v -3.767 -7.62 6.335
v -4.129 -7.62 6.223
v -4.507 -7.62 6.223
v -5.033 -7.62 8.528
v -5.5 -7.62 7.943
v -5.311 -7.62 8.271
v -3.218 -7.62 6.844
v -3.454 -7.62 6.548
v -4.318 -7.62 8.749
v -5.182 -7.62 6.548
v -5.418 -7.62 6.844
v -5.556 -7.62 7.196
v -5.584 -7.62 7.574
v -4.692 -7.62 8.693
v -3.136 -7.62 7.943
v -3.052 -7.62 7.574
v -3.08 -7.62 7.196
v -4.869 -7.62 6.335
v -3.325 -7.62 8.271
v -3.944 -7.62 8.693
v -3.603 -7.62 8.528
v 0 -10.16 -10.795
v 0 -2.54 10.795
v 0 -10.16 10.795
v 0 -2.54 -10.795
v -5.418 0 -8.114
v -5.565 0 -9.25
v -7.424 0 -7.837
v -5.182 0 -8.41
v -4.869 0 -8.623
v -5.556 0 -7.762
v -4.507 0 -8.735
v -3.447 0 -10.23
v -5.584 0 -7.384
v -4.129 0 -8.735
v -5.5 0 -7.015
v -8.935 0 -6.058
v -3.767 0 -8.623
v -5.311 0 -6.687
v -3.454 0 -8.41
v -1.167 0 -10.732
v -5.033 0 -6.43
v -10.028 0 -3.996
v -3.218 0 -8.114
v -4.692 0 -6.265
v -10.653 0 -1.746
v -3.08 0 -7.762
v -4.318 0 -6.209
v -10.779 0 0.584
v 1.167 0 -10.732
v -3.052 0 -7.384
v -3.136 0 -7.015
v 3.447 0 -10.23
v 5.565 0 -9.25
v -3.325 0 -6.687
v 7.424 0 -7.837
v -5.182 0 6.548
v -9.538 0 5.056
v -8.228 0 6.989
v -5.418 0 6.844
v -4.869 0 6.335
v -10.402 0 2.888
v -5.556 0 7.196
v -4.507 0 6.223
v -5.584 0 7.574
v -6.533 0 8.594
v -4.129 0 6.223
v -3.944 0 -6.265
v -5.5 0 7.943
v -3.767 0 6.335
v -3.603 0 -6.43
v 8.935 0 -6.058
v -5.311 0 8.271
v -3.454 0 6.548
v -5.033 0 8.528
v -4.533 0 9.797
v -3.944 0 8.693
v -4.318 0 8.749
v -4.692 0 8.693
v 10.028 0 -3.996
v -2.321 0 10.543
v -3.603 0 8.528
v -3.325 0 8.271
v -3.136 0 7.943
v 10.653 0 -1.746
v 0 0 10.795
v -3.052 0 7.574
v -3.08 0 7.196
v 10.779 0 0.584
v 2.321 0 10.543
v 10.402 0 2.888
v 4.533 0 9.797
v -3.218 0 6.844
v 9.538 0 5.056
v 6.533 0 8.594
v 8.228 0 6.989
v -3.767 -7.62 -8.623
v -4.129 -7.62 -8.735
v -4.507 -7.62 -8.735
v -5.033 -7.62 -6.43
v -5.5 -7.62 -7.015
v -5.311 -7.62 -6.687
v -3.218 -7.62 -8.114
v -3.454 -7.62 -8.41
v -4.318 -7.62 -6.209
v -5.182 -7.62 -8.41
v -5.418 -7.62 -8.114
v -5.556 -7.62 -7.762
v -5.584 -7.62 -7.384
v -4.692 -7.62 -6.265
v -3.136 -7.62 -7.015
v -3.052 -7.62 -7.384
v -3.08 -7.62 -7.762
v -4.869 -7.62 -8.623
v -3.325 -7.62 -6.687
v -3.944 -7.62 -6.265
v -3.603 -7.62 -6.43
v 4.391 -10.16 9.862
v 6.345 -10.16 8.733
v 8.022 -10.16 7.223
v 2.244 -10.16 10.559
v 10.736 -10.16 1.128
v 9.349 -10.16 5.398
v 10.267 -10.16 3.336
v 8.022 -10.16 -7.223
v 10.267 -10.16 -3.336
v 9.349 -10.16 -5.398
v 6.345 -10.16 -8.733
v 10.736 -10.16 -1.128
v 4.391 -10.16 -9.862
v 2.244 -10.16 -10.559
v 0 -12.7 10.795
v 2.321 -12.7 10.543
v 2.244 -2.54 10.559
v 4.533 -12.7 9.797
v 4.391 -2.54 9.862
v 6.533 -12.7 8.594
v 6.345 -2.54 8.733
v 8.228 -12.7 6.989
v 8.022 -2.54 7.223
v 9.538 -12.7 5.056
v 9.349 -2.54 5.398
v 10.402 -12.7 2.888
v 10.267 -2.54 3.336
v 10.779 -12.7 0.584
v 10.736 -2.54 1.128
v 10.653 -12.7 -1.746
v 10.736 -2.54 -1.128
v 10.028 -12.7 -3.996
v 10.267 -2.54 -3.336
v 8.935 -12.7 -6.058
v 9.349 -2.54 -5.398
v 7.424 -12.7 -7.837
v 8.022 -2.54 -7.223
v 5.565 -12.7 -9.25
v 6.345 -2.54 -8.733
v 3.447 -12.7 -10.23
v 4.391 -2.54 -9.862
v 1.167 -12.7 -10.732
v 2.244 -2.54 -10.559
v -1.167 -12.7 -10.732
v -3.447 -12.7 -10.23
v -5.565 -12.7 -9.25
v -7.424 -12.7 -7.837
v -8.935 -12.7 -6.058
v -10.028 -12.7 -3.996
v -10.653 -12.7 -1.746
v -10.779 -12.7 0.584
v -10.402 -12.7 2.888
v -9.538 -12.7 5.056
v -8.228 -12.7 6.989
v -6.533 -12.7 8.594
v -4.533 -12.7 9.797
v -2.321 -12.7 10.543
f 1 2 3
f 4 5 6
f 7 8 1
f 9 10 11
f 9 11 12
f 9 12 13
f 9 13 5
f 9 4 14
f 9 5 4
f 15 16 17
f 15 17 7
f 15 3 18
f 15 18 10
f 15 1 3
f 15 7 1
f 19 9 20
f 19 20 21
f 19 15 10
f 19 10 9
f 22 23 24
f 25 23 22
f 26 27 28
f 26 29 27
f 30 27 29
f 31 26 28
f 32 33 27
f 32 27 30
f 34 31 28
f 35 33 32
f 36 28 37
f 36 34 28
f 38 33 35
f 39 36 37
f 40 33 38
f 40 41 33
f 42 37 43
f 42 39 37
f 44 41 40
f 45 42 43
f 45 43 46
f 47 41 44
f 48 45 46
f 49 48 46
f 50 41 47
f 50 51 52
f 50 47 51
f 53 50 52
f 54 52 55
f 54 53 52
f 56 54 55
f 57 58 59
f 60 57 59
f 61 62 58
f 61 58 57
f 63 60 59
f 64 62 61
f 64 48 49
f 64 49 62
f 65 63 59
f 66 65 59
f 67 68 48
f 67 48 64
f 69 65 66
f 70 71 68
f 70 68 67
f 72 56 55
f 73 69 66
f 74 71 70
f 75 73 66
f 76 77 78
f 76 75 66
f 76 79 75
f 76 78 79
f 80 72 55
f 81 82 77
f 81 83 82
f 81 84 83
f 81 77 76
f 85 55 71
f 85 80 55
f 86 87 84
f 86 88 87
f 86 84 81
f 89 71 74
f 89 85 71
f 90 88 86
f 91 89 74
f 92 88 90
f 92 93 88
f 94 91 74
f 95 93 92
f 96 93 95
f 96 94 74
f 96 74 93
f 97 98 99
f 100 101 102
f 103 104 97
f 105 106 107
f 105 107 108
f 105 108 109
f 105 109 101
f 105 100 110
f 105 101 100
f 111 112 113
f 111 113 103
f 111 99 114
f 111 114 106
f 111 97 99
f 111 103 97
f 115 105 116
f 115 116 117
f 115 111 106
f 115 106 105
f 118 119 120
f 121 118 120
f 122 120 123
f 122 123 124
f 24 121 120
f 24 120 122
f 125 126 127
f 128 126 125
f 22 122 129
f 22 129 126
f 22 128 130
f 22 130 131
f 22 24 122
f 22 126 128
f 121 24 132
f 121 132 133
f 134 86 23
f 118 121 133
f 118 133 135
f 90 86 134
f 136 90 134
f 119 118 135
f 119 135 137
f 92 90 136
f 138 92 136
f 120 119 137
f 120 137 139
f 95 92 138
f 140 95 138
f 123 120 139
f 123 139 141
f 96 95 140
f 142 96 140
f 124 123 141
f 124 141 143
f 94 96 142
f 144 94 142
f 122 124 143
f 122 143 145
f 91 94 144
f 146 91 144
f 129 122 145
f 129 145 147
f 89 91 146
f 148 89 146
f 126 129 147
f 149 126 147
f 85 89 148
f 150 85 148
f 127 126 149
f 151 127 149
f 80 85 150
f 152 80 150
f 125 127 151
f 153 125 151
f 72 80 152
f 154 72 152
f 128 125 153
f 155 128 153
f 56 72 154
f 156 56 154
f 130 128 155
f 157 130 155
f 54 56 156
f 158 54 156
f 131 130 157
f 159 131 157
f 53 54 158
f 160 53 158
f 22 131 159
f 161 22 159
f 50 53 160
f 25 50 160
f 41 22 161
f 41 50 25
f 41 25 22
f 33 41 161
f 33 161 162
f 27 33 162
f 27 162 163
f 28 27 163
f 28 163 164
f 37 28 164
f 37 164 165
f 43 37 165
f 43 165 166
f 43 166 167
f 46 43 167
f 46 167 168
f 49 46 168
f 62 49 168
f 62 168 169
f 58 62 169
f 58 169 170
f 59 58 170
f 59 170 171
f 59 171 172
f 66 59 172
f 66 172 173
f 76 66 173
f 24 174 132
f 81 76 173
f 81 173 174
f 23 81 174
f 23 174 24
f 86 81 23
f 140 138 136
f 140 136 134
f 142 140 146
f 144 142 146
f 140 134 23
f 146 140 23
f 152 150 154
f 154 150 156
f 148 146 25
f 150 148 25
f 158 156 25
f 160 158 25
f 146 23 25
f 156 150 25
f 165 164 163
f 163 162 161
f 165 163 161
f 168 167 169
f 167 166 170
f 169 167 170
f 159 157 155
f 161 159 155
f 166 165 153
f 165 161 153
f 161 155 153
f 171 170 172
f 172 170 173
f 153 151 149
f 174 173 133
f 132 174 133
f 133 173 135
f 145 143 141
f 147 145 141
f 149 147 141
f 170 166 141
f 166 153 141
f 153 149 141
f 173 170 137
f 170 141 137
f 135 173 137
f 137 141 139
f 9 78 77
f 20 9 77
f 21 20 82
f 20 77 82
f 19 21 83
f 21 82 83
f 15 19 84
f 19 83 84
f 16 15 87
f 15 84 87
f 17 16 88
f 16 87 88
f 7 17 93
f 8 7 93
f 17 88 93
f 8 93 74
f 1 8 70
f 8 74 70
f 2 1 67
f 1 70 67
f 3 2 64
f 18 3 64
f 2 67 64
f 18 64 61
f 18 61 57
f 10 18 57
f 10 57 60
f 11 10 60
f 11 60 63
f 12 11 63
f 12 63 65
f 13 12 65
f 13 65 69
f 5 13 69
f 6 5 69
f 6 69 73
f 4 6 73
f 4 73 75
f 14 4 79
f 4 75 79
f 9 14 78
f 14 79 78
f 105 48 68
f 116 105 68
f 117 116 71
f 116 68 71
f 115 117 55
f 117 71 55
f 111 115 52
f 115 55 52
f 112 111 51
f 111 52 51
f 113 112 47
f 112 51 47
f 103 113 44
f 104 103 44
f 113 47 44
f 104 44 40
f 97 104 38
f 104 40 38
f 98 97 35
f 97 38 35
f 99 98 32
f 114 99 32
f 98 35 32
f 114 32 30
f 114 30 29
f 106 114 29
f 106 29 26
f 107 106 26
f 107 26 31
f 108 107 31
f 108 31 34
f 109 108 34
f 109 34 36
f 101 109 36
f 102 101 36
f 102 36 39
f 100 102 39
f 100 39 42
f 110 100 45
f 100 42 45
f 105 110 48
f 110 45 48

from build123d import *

# Parameters (mm, degrees)
SKETCH2_R           = 10.795
BOSS_EXTRUDE1_DEPTH = 12.7
SKETCH3_W           = 25.439299018
SKETCH3_H           = 7.62
CUT_EXTRUDE1_DEPTH  = 20.858349629
SKETCH5_R           = 1.27
CUT_EXTRUDE2_DEPTH  = 7.62


with BuildPart() as part:
    # Sketch2 → Boss-Extrude1 (new body)
    with BuildSketch(Plane(origin=(0, 0, 0), x_dir=(1, 0, 0), z_dir=(0, 1, 0))):
        with Locations(Location((0, 0, 0), (0, 0, 270))):
            Circle(SKETCH2_R)
    extrude(amount=-BOSS_EXTRUDE1_DEPTH)

    # Sketch3 → Cut-Extrude1 (cut, through all)
    with BuildSketch(Plane(origin=(0, 0, 0), x_dir=(0, 0, -1), z_dir=(1, 0, 0))):
        with Locations((-0.92844157, -6.35)):
            Rectangle(SKETCH3_W, SKETCH3_H)
    extrude(amount=CUT_EXTRUDE1_DEPTH, mode=Mode.SUBTRACT)

    # Sketch5 → Cut-Extrude2 (cut)
    with BuildSketch(Plane(origin=(0, 0, 0), x_dir=(1, 0, 0), z_dir=(0, 1, 0))):
        with Locations(Location((-4.318, -7.478995387, 0), (0, 0, 270))):
            Circle(SKETCH5_R)
        with Locations(Location((-4.318, 7.478995387, 0), (0, 0, 270))):
            Circle(SKETCH5_R)
    extrude(amount=-CUT_EXTRUDE2_DEPTH, mode=Mode.SUBTRACT)


solid = part.part
